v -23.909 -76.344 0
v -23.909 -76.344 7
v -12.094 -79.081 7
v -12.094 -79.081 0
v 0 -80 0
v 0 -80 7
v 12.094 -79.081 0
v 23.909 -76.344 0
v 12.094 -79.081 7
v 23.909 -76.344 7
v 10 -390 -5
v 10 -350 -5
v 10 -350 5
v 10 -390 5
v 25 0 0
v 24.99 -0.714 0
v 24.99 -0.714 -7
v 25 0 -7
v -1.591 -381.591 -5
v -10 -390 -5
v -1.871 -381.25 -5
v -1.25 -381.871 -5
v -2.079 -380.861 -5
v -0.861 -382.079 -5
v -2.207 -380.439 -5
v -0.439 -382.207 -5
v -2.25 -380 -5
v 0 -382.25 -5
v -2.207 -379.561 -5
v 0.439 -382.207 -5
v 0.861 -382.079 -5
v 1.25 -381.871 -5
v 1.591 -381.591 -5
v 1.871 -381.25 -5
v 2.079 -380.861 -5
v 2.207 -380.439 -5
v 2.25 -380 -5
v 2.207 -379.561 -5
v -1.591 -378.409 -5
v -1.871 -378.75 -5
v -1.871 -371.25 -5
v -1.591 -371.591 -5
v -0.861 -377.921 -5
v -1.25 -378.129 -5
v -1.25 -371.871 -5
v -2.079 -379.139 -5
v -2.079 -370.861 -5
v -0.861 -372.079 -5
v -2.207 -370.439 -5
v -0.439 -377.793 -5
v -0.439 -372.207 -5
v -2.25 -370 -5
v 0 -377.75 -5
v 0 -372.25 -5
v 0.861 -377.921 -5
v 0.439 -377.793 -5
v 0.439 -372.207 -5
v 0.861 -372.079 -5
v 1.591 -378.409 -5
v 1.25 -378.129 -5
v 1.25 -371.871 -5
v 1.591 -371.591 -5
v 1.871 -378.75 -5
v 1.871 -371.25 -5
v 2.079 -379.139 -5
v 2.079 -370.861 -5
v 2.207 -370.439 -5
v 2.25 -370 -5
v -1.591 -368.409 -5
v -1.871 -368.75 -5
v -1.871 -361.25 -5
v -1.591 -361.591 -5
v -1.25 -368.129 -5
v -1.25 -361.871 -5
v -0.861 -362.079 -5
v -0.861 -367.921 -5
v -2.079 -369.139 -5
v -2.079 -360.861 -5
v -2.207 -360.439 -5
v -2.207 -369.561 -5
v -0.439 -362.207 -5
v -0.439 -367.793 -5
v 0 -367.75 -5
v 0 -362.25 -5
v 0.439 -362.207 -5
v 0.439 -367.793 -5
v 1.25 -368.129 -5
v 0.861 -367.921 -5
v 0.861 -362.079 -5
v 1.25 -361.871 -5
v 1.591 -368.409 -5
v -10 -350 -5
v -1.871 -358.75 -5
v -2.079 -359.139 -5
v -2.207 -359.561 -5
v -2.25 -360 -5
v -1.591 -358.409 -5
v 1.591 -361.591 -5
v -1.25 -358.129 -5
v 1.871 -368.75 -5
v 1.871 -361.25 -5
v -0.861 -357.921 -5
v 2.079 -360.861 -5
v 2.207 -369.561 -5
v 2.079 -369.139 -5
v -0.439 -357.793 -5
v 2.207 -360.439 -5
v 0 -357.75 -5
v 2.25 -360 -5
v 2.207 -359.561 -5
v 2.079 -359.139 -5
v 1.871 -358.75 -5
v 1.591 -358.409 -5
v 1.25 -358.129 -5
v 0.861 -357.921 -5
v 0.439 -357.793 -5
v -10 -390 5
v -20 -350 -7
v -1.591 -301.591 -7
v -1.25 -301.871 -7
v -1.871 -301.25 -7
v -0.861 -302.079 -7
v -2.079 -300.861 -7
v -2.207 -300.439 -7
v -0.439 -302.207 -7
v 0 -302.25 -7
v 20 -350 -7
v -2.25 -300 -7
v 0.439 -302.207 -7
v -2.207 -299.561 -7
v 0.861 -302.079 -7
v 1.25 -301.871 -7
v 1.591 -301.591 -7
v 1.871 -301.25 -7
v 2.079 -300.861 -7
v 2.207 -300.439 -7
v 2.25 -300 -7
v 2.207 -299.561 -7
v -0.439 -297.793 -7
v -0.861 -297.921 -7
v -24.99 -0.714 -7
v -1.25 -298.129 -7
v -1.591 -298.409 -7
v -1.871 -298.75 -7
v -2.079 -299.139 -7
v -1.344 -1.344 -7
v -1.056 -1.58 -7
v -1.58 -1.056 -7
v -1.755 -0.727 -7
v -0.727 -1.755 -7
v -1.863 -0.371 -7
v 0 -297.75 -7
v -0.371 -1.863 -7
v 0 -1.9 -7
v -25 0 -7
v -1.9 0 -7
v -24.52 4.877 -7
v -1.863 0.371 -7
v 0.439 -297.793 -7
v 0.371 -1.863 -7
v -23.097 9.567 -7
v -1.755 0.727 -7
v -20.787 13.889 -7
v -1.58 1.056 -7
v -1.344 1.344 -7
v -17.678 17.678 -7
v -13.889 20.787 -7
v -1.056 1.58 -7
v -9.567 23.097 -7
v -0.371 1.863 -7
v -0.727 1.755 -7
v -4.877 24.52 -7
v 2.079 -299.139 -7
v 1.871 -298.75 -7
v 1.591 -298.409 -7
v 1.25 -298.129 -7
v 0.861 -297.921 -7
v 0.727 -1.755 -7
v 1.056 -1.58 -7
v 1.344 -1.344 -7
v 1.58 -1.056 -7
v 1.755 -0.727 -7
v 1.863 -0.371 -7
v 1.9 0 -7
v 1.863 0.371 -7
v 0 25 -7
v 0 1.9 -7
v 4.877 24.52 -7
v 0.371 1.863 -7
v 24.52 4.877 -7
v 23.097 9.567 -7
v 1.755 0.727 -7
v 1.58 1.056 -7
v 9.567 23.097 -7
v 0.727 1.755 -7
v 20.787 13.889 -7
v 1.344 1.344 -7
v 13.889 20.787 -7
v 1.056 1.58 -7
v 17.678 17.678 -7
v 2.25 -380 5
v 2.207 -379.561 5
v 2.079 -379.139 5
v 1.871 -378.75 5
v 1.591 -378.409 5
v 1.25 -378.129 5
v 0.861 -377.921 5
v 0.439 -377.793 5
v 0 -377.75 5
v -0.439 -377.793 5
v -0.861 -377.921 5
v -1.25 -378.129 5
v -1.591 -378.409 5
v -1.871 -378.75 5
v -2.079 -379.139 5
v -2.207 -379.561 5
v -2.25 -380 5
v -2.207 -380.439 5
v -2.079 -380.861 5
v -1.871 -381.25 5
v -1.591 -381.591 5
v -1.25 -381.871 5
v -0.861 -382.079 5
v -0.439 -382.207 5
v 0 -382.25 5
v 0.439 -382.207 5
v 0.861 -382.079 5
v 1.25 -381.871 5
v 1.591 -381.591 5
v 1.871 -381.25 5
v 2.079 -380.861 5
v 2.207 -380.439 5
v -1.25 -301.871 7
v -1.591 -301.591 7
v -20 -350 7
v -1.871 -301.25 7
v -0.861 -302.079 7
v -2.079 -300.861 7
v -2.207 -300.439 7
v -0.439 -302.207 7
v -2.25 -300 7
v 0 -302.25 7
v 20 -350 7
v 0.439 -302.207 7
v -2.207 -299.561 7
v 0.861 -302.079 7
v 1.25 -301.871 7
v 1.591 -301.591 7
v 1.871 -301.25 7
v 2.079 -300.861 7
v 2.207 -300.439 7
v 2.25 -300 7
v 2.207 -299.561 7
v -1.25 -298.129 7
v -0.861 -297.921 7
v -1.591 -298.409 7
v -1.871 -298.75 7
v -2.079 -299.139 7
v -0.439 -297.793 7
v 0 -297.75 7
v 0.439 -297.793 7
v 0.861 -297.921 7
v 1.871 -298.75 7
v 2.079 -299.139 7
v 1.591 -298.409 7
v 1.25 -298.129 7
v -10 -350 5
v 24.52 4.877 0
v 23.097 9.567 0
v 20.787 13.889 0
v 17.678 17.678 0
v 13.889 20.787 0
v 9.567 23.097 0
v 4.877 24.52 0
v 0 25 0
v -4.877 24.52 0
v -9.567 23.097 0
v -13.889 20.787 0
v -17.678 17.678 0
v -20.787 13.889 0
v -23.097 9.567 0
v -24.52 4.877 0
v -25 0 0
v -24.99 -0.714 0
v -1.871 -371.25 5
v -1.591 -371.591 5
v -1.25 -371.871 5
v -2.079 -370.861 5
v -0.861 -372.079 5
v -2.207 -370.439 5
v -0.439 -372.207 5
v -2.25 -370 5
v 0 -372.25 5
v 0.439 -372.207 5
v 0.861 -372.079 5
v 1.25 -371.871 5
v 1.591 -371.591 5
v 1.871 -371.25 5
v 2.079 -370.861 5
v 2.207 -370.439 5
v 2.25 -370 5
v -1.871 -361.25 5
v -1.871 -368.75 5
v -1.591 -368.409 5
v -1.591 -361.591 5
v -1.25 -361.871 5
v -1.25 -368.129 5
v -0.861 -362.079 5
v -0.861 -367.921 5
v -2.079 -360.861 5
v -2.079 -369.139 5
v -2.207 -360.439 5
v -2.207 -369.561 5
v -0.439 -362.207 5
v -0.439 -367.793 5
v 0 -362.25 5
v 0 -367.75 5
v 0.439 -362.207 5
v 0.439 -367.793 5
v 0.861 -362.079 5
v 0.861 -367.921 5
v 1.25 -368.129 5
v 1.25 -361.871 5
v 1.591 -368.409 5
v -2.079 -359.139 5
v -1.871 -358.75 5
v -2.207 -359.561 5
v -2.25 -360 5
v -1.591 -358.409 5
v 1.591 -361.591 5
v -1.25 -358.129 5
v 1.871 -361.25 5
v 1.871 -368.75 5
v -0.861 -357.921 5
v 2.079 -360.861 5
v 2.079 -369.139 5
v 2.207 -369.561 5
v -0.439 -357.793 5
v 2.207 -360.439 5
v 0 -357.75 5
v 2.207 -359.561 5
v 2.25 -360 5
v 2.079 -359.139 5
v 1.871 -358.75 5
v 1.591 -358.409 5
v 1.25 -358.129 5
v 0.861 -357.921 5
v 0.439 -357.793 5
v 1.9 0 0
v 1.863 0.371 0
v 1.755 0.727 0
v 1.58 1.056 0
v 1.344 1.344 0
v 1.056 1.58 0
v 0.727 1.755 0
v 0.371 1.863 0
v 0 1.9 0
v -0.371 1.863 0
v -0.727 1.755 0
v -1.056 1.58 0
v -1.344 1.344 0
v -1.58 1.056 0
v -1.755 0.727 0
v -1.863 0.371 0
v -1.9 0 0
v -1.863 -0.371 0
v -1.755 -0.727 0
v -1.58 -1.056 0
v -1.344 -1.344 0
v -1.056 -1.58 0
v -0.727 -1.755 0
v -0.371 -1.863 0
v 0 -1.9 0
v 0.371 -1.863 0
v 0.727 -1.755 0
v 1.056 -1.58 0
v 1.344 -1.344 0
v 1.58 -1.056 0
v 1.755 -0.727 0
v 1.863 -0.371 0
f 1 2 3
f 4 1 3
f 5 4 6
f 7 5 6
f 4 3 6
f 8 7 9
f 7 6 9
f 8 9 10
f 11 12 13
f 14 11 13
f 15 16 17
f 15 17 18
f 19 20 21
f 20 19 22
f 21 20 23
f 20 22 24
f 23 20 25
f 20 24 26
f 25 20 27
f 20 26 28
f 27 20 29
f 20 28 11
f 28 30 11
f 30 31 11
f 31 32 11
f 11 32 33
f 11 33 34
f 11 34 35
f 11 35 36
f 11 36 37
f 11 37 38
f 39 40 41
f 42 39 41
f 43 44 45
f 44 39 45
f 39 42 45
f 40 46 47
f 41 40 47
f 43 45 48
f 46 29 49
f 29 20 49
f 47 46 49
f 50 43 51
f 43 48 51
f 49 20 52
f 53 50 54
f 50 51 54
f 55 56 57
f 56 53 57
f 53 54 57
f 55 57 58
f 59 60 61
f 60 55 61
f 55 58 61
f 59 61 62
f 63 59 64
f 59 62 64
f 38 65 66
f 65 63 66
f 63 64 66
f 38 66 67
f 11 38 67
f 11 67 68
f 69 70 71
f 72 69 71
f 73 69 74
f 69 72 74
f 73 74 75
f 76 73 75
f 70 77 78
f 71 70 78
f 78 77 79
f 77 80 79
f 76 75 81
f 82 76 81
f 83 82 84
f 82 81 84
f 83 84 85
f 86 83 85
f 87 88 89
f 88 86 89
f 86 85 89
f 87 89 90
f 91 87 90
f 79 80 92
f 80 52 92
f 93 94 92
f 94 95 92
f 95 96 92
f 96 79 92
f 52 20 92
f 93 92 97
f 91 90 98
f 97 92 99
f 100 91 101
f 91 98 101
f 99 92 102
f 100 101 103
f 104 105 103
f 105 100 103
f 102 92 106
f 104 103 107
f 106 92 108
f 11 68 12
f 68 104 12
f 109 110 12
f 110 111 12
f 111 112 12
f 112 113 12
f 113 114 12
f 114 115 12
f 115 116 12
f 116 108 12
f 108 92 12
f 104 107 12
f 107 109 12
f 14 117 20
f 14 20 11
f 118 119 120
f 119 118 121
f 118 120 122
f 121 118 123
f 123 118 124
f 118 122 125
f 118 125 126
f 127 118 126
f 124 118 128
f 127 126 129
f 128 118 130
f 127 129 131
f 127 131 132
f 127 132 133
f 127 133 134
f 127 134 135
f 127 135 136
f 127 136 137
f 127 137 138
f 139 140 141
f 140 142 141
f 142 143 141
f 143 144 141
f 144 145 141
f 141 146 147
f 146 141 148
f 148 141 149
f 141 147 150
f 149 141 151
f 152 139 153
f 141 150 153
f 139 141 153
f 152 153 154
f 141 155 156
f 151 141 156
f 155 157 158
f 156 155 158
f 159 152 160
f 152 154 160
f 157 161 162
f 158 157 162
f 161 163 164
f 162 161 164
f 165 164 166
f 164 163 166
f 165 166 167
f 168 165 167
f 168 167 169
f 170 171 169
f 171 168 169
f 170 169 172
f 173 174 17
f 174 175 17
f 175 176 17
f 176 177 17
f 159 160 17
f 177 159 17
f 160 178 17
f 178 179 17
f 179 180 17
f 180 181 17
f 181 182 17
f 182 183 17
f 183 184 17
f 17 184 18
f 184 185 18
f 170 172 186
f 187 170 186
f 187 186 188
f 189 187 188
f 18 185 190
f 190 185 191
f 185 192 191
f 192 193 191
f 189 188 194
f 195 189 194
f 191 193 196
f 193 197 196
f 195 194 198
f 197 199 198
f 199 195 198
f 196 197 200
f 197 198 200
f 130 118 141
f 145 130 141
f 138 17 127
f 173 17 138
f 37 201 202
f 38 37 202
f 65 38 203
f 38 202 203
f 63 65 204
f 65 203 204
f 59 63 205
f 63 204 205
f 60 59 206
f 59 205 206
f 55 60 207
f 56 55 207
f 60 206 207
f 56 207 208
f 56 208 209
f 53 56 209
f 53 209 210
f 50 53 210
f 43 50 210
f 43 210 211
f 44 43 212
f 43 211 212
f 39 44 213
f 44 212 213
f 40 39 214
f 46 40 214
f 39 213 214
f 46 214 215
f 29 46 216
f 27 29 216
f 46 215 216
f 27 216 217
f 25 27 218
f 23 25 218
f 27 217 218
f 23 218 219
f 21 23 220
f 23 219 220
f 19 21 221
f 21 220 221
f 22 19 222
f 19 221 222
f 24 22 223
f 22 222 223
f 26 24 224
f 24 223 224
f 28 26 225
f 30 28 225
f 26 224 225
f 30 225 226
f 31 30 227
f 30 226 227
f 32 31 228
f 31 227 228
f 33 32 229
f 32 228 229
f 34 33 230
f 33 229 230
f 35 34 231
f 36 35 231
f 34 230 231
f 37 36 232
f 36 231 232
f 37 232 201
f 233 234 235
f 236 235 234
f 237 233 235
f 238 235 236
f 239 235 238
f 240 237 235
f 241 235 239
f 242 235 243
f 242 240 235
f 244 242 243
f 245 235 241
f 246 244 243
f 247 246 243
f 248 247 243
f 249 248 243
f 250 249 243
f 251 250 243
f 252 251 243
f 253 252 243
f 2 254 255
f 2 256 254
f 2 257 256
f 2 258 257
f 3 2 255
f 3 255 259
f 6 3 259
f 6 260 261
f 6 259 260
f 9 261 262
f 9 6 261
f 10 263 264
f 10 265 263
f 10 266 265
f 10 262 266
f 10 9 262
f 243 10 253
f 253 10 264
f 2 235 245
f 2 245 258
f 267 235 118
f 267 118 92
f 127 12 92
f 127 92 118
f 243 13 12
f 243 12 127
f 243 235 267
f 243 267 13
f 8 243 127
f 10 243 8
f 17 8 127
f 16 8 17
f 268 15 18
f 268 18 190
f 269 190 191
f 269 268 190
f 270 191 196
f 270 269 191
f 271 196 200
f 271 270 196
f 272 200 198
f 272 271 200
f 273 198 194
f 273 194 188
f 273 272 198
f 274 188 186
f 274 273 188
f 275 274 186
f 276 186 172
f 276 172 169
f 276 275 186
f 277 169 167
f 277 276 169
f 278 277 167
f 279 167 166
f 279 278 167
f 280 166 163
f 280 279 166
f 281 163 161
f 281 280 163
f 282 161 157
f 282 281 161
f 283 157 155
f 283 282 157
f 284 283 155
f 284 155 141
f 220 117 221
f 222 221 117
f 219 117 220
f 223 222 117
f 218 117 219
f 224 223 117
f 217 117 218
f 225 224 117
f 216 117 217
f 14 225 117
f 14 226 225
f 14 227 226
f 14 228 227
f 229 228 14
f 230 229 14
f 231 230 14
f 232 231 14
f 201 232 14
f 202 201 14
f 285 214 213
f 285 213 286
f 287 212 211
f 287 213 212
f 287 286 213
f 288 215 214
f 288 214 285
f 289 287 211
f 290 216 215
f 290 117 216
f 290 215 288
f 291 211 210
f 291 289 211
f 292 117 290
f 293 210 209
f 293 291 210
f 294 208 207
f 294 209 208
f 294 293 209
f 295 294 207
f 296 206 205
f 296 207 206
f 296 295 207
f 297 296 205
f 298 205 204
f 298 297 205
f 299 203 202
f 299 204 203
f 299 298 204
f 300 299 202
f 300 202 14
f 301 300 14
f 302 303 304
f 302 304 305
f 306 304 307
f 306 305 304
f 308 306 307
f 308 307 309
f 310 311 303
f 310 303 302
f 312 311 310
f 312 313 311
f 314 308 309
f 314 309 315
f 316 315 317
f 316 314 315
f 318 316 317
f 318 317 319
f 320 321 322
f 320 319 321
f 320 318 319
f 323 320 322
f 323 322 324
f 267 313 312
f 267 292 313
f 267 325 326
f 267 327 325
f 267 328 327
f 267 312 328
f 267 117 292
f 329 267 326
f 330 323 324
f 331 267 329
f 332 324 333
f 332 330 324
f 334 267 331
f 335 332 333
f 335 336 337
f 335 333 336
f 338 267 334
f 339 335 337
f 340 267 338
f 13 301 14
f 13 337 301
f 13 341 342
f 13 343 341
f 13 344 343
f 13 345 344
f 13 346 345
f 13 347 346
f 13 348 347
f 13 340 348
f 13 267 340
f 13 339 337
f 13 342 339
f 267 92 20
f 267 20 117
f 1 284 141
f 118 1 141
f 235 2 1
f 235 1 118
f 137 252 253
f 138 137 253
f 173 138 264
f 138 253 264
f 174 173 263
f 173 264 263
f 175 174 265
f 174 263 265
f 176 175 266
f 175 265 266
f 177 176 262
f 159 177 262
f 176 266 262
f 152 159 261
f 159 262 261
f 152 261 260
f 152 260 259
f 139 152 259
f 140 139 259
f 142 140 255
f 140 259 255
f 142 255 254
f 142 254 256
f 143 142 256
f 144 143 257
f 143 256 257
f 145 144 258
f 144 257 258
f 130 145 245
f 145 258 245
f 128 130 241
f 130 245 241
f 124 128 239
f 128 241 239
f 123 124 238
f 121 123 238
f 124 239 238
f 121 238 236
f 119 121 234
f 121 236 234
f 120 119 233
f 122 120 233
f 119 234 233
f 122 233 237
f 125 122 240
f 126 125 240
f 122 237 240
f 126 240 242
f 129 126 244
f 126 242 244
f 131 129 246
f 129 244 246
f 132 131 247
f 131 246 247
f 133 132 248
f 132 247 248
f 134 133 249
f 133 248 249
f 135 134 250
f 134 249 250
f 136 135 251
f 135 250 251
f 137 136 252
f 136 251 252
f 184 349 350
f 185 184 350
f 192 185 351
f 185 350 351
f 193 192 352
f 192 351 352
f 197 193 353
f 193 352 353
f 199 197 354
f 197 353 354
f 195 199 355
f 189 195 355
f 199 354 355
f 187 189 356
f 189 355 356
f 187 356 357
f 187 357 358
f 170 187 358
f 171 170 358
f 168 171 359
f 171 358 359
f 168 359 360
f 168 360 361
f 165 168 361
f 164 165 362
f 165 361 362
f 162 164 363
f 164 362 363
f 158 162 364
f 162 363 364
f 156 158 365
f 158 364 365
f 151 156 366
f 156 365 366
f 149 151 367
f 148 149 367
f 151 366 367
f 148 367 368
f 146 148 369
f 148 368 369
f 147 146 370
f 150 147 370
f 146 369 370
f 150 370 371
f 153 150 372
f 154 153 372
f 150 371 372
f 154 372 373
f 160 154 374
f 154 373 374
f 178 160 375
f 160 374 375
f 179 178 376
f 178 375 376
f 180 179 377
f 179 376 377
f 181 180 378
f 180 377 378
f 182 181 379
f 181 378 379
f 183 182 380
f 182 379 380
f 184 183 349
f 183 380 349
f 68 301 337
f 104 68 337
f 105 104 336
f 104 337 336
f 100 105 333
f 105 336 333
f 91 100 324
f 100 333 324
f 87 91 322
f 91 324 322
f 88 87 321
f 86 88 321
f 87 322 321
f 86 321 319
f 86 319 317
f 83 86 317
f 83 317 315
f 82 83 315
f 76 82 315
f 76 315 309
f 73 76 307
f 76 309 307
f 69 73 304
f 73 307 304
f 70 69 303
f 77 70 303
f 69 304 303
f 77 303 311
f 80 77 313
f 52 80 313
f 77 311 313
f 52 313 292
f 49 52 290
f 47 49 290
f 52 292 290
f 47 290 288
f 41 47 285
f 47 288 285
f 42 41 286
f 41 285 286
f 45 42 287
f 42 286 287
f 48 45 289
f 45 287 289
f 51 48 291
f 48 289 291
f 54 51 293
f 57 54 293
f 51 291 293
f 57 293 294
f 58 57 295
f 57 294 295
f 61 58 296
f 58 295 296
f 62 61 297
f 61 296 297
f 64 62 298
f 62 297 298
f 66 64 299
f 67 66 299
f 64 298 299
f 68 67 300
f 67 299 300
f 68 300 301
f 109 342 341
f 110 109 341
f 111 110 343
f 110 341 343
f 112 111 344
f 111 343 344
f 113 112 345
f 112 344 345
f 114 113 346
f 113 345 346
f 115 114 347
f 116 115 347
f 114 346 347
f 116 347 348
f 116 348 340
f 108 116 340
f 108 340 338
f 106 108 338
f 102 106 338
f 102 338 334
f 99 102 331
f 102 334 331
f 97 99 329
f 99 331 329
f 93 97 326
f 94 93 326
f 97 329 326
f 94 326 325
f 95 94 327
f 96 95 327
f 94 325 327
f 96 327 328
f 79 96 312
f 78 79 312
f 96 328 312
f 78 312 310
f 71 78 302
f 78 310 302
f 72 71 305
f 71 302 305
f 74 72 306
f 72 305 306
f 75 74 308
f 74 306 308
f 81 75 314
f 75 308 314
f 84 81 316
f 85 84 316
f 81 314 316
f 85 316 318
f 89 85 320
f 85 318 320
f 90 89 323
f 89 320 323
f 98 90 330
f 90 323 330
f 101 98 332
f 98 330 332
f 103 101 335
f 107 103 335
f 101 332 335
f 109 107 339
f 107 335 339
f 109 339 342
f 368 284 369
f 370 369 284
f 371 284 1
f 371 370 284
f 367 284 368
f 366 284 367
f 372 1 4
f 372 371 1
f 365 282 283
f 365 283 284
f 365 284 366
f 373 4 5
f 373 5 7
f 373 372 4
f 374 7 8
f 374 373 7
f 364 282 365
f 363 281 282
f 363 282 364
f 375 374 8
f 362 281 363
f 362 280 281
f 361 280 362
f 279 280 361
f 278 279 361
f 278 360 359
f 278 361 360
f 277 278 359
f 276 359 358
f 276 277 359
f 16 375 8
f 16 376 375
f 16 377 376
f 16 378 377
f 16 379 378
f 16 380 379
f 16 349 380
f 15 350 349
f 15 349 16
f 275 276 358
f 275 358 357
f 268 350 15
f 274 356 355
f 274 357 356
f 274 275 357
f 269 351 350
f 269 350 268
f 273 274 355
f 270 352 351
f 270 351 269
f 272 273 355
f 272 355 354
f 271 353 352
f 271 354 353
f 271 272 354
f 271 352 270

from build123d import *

# Parameters (mm, degrees)
BOSS_EXTRUDE3_DEPTH = 7
SKETCH17_R          = 80
CUT_EXTRUDE9_DEPTH  = 7
SKETCH18_R          = 2.25
CUT_EXTRUDE10_DEPTH = 14
SKETCH19_R          = 1.9
CUT_EXTRUDE11_DEPTH = 7
SKETCH14_W          = 20
SKETCH14_H          = 10
BOSS_EXTRUDE4_DEPTH = 40
SKETCH20_R          = 2.25
CUT_EXTRUDE12_DEPTH = 10
LPATTERN1_COUNT     = 3
LPATTERN1_PITCH     = 10


with BuildPart() as part:
    # Sketch7 → Boss-Extrude3 (new, symmetric)
    with BuildSketch(Plane.XY):
        with BuildLine():
            ThreePointArc((25, 0), (0, 25), (-25, 0))
            Line((-25, 0), (-24.989798, -0.714139971))
            ThreePointArc((-24.989798, -0.714139971), (0, -25), (24.989798, -0.714139971))
            Line((24.989798, -0.714139971), (25, 0))
        make_face()
        with BuildLine():
            ThreePointArc((24.989798, -0.714139971), (0, -25), (-24.989798, -0.714139971))
            Line((-24.989798, -0.714139971), (-20, -350))
            Line((-20, -350), (20, -350))
            Line((20, -350), (24.989798, -0.714139971))
        make_face()
    extrude(amount=BOSS_EXTRUDE3_DEPTH, both=True)

    # Sketch17 → Cut-Extrude9 (cut)
    with BuildSketch(Plane.XY.offset(7)):
        Circle(SKETCH17_R)
    extrude(amount=-CUT_EXTRUDE9_DEPTH, mode=Mode.SUBTRACT)

    # Sketch18 → Cut-Extrude10 (cut)
    with BuildSketch(Plane.XY.offset(7)):
        with Locations((0, -300)):
            Circle(SKETCH18_R)
    extrude(amount=-CUT_EXTRUDE10_DEPTH, mode=Mode.SUBTRACT)

    # Sketch19 → Cut-Extrude11 (cut)
    with BuildSketch(Plane.XY):
        Circle(SKETCH19_R)
    extrude(amount=-CUT_EXTRUDE11_DEPTH, mode=Mode.SUBTRACT)

    # Sketch14 → Boss-Extrude4 (add)
    with BuildSketch(Plane.XZ.offset(350)):
        Rectangle(SKETCH14_W, SKETCH14_H)
    extrude(amount=BOSS_EXTRUDE4_DEPTH)

    # Sketch20 → Cut-Extrude12 (cut)
    with BuildSketch(Plane.XY.offset(5)):
        with Locations((0, -360)):
            Circle(SKETCH20_R)
    cut_extrude12 = extrude(amount=-CUT_EXTRUDE12_DEPTH, mode=Mode.SUBTRACT)

    # LPattern1: Cut-Extrude12 ×3
    with Locations(*[(0, -i * LPATTERN1_PITCH, 0) for i in range(1, LPATTERN1_COUNT)]):
        add(cut_extrude12, mode=Mode.SUBTRACT)


solid = part.part
